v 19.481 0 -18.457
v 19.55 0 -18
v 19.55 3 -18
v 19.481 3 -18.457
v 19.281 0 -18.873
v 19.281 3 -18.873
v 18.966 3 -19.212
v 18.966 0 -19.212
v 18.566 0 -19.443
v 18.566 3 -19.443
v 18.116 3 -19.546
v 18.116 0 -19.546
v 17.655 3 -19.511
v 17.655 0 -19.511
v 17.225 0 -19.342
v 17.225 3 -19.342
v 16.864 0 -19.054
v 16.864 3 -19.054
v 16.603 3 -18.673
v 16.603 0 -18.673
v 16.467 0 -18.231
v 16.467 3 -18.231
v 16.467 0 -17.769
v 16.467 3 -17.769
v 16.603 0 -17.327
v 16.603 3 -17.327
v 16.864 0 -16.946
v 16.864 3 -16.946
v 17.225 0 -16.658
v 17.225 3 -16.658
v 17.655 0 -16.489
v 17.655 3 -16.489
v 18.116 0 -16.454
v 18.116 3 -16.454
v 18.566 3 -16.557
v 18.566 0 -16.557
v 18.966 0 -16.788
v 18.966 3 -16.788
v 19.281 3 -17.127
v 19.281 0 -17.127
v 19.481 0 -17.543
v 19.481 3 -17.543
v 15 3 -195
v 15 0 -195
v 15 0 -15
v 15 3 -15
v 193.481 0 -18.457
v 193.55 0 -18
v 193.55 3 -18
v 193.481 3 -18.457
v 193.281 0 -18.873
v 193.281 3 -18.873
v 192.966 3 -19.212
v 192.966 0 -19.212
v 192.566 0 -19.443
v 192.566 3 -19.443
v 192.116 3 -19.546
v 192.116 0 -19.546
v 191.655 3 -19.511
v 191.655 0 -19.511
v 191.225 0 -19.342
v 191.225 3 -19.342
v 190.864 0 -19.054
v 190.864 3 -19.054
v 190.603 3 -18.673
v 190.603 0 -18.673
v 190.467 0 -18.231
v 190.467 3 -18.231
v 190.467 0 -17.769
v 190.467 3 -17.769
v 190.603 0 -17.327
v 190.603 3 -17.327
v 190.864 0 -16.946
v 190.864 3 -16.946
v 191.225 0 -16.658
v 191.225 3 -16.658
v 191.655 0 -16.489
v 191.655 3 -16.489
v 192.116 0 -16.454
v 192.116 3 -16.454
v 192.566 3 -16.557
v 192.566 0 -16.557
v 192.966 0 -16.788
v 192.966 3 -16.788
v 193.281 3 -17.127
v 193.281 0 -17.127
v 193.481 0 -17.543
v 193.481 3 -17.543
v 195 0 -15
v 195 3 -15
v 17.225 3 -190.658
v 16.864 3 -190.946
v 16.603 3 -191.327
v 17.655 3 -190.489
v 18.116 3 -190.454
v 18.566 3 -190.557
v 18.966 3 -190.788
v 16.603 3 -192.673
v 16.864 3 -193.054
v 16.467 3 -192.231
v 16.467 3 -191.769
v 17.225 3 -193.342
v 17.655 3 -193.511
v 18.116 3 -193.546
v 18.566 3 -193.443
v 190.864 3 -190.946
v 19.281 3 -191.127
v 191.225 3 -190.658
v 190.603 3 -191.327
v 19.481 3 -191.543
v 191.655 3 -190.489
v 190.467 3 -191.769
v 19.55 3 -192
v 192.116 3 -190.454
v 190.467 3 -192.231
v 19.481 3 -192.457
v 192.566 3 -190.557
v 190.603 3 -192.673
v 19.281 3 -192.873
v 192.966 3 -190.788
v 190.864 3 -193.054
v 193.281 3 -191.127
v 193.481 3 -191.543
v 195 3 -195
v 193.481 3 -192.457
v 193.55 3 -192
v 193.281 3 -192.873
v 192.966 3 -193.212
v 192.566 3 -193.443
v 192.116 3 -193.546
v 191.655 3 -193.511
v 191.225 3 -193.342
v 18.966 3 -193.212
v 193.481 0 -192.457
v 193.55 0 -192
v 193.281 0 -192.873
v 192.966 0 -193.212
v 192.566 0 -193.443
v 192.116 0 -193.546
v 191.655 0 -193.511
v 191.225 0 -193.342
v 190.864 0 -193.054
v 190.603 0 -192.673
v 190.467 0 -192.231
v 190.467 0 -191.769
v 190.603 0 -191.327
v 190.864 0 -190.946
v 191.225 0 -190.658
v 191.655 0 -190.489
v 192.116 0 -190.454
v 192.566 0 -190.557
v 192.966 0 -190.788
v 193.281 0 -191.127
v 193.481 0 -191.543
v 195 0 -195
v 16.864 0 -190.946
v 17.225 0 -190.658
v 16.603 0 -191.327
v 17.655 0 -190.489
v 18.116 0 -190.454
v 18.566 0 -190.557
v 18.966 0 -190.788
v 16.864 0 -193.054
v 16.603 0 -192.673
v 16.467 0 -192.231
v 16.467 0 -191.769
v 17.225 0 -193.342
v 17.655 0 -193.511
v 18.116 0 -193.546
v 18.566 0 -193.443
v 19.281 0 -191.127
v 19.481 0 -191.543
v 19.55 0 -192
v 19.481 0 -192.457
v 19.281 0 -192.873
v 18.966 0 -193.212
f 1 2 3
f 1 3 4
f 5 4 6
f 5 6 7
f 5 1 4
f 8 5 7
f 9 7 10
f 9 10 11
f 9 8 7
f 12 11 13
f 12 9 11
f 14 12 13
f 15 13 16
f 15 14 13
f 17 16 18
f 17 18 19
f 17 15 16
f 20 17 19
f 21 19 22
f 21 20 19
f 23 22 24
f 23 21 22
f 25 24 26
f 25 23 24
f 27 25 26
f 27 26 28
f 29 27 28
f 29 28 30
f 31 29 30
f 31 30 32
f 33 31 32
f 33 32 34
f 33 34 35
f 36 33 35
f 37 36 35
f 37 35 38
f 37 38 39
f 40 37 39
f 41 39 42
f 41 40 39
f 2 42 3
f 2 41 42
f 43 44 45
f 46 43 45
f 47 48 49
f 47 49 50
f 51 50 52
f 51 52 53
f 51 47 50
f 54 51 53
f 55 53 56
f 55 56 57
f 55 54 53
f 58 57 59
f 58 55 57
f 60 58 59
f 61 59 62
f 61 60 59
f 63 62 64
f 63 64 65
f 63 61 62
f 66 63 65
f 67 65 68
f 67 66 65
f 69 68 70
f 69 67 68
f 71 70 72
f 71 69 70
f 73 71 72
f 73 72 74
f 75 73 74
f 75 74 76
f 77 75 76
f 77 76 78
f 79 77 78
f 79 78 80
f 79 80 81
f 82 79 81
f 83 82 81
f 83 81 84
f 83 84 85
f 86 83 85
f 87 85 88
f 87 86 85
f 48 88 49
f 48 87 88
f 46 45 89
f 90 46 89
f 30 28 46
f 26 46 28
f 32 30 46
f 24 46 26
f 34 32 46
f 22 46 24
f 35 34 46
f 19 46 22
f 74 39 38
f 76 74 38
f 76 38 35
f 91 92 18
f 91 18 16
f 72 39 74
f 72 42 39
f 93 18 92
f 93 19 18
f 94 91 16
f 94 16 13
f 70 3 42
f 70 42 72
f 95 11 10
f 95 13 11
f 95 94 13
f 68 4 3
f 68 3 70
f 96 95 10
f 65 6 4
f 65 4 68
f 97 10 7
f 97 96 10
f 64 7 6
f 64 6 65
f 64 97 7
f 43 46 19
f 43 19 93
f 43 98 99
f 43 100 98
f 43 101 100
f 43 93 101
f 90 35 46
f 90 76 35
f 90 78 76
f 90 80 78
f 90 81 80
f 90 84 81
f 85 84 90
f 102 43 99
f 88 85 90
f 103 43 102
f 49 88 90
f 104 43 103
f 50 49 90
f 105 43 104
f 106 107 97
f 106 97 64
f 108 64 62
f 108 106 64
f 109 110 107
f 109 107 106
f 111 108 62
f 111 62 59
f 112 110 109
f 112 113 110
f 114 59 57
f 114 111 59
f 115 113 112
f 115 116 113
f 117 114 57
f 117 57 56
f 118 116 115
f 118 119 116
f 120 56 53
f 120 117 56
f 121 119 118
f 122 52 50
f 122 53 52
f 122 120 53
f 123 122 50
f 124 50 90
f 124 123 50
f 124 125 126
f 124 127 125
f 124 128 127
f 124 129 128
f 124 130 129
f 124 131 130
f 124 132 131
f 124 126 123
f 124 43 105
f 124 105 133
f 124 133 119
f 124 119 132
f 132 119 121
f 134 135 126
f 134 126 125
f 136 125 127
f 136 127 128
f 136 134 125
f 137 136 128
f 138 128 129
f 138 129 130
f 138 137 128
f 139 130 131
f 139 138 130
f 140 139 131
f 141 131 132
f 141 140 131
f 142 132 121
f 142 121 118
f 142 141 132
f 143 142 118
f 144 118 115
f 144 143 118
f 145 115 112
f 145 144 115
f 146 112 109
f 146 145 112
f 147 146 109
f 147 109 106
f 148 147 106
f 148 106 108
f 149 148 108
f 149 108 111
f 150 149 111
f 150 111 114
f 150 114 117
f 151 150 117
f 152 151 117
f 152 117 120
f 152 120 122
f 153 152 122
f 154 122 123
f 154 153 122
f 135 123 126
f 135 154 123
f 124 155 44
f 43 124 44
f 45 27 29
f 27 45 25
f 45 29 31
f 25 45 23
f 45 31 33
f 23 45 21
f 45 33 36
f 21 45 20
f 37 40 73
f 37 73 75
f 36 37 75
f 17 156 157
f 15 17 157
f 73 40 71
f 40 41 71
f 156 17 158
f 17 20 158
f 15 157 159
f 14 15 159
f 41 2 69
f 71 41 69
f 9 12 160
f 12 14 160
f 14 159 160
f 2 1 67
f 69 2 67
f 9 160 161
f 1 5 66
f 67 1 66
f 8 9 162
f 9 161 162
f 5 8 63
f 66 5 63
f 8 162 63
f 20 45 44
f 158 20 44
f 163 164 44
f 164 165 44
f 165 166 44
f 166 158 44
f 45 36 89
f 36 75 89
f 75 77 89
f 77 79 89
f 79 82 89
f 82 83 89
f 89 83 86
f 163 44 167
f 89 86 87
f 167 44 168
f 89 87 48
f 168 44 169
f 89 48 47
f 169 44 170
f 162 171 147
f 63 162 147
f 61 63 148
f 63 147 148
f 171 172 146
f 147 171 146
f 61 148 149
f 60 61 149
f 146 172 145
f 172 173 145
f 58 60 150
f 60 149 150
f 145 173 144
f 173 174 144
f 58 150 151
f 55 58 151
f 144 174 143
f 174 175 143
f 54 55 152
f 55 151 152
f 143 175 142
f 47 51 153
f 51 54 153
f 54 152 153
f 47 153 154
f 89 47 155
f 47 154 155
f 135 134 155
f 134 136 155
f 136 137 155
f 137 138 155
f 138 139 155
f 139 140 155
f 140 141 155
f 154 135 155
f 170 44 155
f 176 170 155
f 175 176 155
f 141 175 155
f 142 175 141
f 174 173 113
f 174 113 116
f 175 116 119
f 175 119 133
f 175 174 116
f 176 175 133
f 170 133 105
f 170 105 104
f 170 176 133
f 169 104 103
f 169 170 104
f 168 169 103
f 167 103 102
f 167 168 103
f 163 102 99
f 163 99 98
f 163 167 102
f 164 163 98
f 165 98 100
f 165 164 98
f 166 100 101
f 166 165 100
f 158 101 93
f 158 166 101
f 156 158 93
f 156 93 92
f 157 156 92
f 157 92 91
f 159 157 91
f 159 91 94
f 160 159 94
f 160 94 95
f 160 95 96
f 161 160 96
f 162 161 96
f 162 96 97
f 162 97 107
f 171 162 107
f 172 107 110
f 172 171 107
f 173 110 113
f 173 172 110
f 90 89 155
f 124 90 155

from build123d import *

# Parameters (mm, degrees)
SKETCH_3_R      = 1.55
EXTRUDE_2_DEPTH = 3


with BuildPart() as part:
    # 草图3 → 凸台-拉伸2 (new body)
    with BuildSketch(Plane(origin=(0, 0, 0), x_dir=(1, 0, 0), z_dir=(0, 1, 0))):
        Polygon((195, 190), (195, 195), (192, 195), (190, 195), (175, 195), (35, 195), (20, 195), (18, 195), (15, 195), (15, 190), (15, 175), (15, 35), (15, 20), (15, 15), (18, 15), (20, 15), (175, 15), (190, 15), (192, 15), (195, 15), (195, 20), (195, 35), (195, 175), align=None)
        with Locations((18, 18)):
            Circle(SKETCH_3_R, mode=Mode.SUBTRACT)
        with Locations((192, 18)):
            Circle(SKETCH_3_R, mode=Mode.SUBTRACT)
        with Locations((18, 192)):
            Circle(SKETCH_3_R, mode=Mode.SUBTRACT)
        with Locations((192, 192)):
            Circle(SKETCH_3_R, mode=Mode.SUBTRACT)
    extrude(amount=EXTRUDE_2_DEPTH)


solid = part.part
